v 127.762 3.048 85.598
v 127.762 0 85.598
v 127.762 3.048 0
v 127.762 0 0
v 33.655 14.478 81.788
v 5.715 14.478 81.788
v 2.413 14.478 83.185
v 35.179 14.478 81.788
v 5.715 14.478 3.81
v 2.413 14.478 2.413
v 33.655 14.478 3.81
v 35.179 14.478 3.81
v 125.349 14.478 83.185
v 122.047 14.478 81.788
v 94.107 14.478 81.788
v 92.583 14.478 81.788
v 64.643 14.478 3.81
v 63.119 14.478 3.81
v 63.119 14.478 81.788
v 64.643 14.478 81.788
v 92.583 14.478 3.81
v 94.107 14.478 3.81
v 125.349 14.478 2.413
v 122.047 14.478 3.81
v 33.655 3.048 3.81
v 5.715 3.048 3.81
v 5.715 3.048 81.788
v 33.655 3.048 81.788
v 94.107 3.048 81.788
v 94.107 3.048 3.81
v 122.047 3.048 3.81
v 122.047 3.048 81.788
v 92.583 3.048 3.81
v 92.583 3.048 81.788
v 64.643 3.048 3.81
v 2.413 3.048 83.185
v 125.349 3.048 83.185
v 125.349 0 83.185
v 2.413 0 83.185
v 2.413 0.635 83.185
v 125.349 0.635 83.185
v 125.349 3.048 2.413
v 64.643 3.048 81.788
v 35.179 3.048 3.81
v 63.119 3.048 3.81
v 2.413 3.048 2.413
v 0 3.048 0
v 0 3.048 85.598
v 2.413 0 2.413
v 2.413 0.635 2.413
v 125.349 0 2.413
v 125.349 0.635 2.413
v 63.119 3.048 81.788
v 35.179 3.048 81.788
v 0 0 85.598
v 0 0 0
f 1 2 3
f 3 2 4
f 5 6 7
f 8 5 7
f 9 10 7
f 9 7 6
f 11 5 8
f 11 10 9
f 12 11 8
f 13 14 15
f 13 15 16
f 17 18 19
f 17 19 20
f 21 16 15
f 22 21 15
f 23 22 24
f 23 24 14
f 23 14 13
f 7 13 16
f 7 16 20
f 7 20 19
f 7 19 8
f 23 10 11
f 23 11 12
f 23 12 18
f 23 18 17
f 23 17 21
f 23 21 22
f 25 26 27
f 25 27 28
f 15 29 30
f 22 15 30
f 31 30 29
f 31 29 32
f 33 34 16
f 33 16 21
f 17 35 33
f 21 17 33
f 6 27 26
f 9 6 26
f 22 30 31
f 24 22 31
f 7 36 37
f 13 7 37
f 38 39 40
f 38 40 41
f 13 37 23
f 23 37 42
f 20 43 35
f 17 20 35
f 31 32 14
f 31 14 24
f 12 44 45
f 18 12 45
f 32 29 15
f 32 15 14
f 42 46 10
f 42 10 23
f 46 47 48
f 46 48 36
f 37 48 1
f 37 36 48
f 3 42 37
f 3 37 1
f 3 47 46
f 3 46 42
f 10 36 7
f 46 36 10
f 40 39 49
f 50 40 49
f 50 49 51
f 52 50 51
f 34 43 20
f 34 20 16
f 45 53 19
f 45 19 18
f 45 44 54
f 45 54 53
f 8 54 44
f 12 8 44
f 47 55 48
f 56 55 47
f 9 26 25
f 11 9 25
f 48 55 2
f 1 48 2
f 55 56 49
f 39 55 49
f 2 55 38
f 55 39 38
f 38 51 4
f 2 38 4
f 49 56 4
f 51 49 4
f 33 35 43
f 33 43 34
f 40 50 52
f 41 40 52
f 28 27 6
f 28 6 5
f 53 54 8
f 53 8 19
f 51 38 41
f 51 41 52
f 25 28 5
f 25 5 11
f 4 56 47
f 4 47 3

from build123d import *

# Parameters (mm, degrees)
SKETCH1_W           = 127.762
SKETCH1_H           = 85.598
SKETCH1_W_2         = 122.936
SKETCH1_H_2         = 80.772
BOSS_EXTRUDE1_DEPTH = 3.048
SKETCH2_W           = 122.936
SKETCH2_H           = 80.772
BOSS_EXTRUDE2_DEPTH = 2.413
SKETCH3_W           = 122.936
SKETCH3_H           = 80.772
SKETCH3_W_2         = 116.332
SKETCH3_H_2         = 77.978
SKETCH3_W_3         = 1.524
BOSS_EXTRUDE3_DEPTH = 11.43


with BuildPart() as part:
    # Sketch1 → Boss-Extrude1 (new body)
    with BuildSketch(Plane(origin=(0, 0, 0), x_dir=(1, 0, 0), z_dir=(0, 1, 0))):
        with Locations((63.881, -42.799)):
            Rectangle(SKETCH1_W, SKETCH1_H)
        with Locations((63.881, -42.799)):
            Rectangle(SKETCH1_W_2, SKETCH1_H_2, mode=Mode.SUBTRACT)
    extrude(amount=BOSS_EXTRUDE1_DEPTH)

    # Sketch2 → Boss-Extrude2 (add)
    with BuildSketch(Plane(origin=(0, 3.048, 0), x_dir=(1, 0, 0), z_dir=(0, 1, 0))):
        with Locations((63.881, -42.799)):
            Rectangle(SKETCH2_W, SKETCH2_H)
    extrude(amount=-BOSS_EXTRUDE2_DEPTH)

    # Sketch3 → Boss-Extrude3 (add)
    with BuildSketch(Plane(origin=(0, 3.048, 0), x_dir=(1, 0, 0), z_dir=(0, 1, 0))):
        with Locations((63.881, -42.799)):
            Rectangle(SKETCH3_W, SKETCH3_H)
        with Locations((63.881, -42.799)):
            Rectangle(SKETCH3_W_2, SKETCH3_H_2, mode=Mode.SUBTRACT)
        with Locations((34.417, -42.799)):
            Rectangle(SKETCH3_W_3, SKETCH3_H_2)
        with Locations((63.881, -42.799)):
            Rectangle(SKETCH3_W_3, SKETCH3_H_2)
        with Locations((93.345, -42.799)):
            Rectangle(SKETCH3_W_3, SKETCH3_H_2)
    extrude(amount=BOSS_EXTRUDE3_DEPTH)


solid = part.part
